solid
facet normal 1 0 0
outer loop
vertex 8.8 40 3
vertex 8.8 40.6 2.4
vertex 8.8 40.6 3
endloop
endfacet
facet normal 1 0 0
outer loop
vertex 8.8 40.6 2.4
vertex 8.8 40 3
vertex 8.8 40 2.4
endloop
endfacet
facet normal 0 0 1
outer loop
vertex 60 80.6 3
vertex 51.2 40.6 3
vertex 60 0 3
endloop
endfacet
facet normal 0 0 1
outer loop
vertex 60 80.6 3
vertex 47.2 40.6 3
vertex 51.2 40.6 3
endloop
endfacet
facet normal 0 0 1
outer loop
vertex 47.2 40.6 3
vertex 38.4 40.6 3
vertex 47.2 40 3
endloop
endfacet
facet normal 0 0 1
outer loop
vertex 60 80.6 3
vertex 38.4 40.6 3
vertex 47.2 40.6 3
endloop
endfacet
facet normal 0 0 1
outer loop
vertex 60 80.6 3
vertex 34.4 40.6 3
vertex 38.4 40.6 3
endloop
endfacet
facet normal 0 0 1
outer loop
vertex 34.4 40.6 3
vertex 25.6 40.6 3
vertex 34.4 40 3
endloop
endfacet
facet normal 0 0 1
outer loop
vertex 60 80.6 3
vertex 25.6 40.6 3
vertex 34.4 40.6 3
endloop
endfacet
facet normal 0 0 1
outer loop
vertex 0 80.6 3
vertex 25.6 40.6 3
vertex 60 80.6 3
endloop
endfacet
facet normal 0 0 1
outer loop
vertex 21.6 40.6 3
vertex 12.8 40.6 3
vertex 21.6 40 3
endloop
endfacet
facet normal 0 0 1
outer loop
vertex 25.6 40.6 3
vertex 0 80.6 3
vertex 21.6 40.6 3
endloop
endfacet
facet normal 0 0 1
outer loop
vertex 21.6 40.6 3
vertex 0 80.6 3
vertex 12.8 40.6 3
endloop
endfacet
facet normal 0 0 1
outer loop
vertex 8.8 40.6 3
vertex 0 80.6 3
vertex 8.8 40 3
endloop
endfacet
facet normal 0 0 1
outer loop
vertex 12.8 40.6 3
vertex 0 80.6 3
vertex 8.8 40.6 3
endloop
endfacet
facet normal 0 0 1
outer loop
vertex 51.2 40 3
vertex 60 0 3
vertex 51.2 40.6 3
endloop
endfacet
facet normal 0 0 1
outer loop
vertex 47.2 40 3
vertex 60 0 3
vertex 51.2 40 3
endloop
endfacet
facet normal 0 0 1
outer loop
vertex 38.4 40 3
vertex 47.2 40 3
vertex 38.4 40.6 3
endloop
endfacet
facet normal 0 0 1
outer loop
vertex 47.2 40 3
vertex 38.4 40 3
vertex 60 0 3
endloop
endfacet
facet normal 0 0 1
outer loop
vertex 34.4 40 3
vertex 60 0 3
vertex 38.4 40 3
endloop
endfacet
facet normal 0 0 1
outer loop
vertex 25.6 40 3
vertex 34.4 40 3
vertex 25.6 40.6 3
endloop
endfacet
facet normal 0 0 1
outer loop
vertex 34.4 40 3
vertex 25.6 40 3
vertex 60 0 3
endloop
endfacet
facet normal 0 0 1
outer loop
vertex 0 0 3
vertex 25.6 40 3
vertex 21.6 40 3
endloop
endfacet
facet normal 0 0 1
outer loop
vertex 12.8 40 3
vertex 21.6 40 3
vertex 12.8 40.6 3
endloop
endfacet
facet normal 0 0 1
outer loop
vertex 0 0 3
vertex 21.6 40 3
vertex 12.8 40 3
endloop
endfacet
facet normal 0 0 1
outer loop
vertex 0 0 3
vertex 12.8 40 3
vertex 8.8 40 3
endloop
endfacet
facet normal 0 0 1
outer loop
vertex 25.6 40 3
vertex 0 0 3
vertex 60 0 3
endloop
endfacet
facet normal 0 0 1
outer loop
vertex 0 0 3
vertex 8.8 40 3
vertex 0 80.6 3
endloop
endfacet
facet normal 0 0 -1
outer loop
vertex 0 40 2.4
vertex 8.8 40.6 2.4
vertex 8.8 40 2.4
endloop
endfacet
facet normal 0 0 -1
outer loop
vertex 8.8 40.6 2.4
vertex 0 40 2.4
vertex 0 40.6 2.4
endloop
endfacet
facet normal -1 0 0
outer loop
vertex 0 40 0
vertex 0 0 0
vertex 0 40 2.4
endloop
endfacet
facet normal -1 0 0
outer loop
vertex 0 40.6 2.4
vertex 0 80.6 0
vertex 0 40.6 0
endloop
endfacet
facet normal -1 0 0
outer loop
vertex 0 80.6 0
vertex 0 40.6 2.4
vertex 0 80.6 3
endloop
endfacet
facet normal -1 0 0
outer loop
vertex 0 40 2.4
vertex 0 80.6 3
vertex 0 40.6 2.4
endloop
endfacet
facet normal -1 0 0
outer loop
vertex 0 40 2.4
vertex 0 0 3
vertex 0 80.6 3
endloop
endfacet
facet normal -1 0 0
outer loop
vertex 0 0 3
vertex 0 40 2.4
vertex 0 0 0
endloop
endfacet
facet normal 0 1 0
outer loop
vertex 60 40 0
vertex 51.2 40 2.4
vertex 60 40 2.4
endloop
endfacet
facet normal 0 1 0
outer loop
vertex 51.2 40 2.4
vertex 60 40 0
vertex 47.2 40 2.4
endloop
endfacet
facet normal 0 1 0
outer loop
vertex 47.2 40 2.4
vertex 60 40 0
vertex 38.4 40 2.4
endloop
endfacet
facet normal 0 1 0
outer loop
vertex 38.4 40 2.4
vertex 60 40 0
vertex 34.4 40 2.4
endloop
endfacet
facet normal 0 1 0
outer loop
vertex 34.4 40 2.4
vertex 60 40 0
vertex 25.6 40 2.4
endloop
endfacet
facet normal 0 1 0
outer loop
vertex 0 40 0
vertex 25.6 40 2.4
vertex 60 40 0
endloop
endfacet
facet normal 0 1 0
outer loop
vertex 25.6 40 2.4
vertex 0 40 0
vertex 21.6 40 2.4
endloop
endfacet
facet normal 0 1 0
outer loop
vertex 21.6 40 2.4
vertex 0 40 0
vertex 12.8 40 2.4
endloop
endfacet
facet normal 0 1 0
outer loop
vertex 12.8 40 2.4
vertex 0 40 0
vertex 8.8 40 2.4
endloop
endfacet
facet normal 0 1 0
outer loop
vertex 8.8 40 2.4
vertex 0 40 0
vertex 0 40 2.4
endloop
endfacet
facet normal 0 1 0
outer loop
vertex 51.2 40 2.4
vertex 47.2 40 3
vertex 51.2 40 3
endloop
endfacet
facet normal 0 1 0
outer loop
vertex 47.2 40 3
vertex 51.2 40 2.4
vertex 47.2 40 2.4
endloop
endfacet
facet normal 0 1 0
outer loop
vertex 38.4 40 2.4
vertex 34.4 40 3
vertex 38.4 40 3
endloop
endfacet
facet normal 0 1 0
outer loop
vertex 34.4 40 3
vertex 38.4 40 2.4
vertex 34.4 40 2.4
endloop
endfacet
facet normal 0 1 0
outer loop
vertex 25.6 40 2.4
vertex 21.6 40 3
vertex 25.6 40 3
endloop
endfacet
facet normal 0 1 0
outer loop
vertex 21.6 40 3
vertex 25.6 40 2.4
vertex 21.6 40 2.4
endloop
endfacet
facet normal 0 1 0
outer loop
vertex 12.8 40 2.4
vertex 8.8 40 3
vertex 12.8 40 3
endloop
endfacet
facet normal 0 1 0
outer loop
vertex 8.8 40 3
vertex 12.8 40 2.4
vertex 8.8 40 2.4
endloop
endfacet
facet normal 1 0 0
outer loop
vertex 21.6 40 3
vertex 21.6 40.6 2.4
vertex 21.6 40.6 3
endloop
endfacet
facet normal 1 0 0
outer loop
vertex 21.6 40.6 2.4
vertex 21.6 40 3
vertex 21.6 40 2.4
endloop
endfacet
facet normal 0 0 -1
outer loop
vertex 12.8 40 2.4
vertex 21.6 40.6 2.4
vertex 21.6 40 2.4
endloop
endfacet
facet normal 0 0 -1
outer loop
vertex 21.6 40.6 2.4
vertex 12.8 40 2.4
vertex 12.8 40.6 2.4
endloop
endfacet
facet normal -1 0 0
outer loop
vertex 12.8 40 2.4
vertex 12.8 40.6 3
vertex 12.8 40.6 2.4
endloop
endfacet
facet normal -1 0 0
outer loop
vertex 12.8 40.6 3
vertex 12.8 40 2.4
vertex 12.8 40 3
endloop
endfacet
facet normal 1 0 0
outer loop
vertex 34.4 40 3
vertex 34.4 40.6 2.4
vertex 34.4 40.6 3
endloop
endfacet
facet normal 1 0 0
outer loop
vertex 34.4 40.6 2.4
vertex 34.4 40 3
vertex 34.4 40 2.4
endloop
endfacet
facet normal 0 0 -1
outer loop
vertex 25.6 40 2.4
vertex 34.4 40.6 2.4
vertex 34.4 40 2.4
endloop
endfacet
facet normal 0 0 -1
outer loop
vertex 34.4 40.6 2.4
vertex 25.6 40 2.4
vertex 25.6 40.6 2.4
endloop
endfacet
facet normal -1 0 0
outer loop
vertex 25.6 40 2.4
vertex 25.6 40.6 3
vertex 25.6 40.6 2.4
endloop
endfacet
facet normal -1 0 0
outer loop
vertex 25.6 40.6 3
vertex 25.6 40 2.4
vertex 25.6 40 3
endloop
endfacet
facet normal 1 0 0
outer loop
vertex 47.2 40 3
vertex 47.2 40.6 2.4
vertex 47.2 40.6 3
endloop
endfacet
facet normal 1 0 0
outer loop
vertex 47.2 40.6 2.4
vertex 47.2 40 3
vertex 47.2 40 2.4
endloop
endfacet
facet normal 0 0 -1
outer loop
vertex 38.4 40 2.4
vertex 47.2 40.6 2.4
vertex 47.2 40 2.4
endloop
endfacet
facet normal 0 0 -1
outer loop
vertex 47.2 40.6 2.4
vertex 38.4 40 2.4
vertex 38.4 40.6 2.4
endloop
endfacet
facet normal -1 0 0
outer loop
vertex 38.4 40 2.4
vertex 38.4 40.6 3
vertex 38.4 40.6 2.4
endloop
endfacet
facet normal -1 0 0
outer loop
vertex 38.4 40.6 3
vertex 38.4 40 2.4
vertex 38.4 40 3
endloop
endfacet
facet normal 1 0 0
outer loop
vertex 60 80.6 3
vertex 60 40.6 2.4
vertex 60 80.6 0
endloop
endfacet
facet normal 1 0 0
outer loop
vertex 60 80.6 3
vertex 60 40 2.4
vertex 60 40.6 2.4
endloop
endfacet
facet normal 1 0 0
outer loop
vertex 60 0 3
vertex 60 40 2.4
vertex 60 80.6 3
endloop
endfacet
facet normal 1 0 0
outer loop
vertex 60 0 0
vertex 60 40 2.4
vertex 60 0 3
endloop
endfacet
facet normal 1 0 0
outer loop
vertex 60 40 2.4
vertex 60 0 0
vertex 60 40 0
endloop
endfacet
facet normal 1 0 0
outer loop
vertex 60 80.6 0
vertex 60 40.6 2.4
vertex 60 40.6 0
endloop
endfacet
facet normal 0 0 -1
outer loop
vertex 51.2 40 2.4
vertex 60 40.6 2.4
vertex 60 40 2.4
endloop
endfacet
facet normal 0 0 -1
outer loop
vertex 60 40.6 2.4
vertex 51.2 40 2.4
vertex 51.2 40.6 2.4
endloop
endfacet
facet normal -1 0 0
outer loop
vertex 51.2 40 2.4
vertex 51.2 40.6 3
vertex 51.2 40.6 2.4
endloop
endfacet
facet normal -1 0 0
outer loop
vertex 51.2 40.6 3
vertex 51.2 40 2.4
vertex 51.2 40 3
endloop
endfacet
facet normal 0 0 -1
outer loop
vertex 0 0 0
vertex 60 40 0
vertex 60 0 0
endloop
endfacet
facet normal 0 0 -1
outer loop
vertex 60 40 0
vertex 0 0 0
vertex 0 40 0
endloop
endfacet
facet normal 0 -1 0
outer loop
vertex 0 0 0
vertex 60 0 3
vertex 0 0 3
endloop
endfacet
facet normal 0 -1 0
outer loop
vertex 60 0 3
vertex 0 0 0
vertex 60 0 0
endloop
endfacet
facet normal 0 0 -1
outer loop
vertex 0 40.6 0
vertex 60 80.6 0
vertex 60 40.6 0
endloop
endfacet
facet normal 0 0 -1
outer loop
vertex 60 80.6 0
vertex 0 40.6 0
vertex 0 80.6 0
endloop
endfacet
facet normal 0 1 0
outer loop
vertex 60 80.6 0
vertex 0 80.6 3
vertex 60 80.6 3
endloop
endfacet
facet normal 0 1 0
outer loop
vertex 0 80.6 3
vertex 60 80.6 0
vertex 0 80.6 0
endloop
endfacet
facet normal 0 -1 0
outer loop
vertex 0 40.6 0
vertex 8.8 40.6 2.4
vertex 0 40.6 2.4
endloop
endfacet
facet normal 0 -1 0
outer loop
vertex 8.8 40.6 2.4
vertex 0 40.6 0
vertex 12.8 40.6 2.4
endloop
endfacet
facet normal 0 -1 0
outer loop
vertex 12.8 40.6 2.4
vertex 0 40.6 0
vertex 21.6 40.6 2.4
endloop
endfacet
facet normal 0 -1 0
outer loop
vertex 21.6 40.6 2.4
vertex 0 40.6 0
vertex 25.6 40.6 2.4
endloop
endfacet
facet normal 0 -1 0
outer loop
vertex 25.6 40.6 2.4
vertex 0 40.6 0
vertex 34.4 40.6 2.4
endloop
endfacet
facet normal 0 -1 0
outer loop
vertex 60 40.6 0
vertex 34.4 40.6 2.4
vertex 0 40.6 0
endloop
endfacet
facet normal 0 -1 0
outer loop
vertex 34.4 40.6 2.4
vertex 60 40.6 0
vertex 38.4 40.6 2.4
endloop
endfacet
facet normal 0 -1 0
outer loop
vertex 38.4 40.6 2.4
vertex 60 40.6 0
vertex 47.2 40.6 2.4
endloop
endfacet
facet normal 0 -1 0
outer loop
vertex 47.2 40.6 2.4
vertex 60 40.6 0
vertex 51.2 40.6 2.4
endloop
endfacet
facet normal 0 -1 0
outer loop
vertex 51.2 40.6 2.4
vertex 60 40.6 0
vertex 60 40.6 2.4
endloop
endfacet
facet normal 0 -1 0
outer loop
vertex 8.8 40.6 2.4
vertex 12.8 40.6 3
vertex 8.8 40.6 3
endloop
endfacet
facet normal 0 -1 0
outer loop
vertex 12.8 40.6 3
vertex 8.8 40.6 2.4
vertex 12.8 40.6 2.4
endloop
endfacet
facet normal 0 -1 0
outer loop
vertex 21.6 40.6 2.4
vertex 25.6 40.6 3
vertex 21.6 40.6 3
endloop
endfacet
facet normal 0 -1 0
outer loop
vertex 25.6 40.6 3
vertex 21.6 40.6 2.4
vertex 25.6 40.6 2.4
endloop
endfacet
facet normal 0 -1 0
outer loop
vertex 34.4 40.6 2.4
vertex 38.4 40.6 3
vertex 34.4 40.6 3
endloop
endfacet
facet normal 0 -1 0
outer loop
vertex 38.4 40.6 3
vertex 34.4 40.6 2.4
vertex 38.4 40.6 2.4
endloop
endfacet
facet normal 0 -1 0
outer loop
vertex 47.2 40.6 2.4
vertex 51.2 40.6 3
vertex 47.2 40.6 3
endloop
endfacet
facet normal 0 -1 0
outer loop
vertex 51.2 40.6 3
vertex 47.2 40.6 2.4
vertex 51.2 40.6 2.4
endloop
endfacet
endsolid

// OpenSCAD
// =============================================================================
// PARAMETRIC LIVING HINGE
// =============================================================================
// Author  : Arunangshu Roy
// License : CC BY 4.0
//
// MATHEMATICAL BASIS
//
// 1. BENDING STRESS (rectangular cross-section beam in pure bending)
//      sigma_max = M*c / I = 6*M / (b * h^2)
//    where:
//      M = bending moment applied to the hinge
//      b = hinge width
//      h = hinge thickness
//      c = h/2 (distance from neutral axis to outer surface)
//      I = b*h^3/12 (second moment of area, rectangular section)
//
//    CRITICAL: stress scales as 1/h^2. Halving hinge thickness roughly
//    QUADRUPLES peak stress for the same applied moment. This is why
//    hinge_t below has an absolute floor and should never be tuned by
//    instinct alone.
//
// 2. BENDING STRAIN (fatigue driver)
//      epsilon = h / (2*R)
//    where R is the bend radius the hinge curls to when folded flat.
//    Keeping epsilon below the material's fatigue strain limit determines
//    cycle life. PLA fatigue strain limit is low (~1%) -- PLA is a POOR
//    living-hinge material. PP (~15-20%) or TPU is strongly preferred.
//    This script defaults to PP-appropriate geometry; halve hinge_t
//    further only if printing in PP/PETG, never in PLA.
//
// 3. CORRUGATED (multi-rib) HINGES
//    Distributing the bend across N parallel thin ribs instead of one
//    continuous web divides total bending curvature across N hinge
//    elements, each individually experiencing 1/N of the total bend
//    angle's local curvature -- this is why corrugated hinges survive
//    far more cycles than a single wide web of the same total width.
// =============================================================================
// --- Hinge parameters ---
panel_w     = 60;    // Width of each rigid panel (mm)
panel_l     = 40;    // Length of each rigid panel (mm)
panel_t     = 3;     // Rigid panel thickness (mm)
hinge_t     = 0.6;   // Hinge web thickness (mm). ABSOLUTE FLOOR: 0.4mm @ 0.4 nozzle.
                       // See bending stress note -- do not reduce casually.
hinge_gap   = 0.3;   // Vertical gap between panel and hinge web (print release gap)
// --- Corrugation (set rib_count = 1 for a single continuous hinge) ---
rib_count   = 5;     // Number of parallel hinge ribs across panel_w.
rib_gap     = 4;     // Gap between ribs (mm) -- where material is fully removed.
bend_radius_design = 3;  // Target bend radius (mm) when folded -- used only
                           // for the strain echo check below, not geometry.
$fn = 32;
// rigid_panel(): one solid panel half of the hinge assembly.
module rigid_panel() {
    cube([panel_w, panel_l, panel_t]);
}
// hinge_rib(width): a single thin flexible web segment.
// Modelled as a thin slab spanning the gap between the two panels.
module hinge_rib(width) {
    translate([0, panel_l, panel_t - hinge_t])
        cube([width, hinge_gap*2 + 0.01, hinge_t]);
        // Note: hinge sits flush with panel TOP surface (panel_t - hinge_t),
        // not centered, so the hinge prints as a continuous flat plane
        // across the panel boundary -- critical for bridging without sag.
}
// living_hinge_assembly(): two rigid panels connected by N parallel ribs.
// Rib positions are evenly distributed with rib_gap between them --
// the corrugation pattern that lets the hinge flex without a single
// wide web concentrating all bending strain in one place.
module living_hinge_assembly() {
    rib_width = (panel_w - (rib_count - 1) * rib_gap) / rib_count;
    // First rigid panel
    rigid_panel();
    // Second rigid panel, placed after the hinge gap
    translate([0, panel_l + hinge_gap*2, 0])
        rigid_panel();
    // Hinge ribs distributed across the width
    for (i = [0:rib_count-1]) {
        x_pos = i * (rib_width + rib_gap);
        translate([x_pos, 0, 0])
            hinge_rib(rib_width);
    }
}
living_hinge_assembly();
// --- Verification echoes ---
bending_strain = hinge_t / (2 * bend_radius_design);
echo("Hinge bending strain at design radius:", bending_strain * 100, "%");
echo("PLA fatigue strain limit (~1%) -- exceeded?", bending_strain > 0.01);
echo("PP fatigue strain limit (~15-20%) -- exceeded?", bending_strain > 0.15);
echo("Rib width (mm):", (panel_w - (rib_count - 1) * rib_gap) / rib_count);
